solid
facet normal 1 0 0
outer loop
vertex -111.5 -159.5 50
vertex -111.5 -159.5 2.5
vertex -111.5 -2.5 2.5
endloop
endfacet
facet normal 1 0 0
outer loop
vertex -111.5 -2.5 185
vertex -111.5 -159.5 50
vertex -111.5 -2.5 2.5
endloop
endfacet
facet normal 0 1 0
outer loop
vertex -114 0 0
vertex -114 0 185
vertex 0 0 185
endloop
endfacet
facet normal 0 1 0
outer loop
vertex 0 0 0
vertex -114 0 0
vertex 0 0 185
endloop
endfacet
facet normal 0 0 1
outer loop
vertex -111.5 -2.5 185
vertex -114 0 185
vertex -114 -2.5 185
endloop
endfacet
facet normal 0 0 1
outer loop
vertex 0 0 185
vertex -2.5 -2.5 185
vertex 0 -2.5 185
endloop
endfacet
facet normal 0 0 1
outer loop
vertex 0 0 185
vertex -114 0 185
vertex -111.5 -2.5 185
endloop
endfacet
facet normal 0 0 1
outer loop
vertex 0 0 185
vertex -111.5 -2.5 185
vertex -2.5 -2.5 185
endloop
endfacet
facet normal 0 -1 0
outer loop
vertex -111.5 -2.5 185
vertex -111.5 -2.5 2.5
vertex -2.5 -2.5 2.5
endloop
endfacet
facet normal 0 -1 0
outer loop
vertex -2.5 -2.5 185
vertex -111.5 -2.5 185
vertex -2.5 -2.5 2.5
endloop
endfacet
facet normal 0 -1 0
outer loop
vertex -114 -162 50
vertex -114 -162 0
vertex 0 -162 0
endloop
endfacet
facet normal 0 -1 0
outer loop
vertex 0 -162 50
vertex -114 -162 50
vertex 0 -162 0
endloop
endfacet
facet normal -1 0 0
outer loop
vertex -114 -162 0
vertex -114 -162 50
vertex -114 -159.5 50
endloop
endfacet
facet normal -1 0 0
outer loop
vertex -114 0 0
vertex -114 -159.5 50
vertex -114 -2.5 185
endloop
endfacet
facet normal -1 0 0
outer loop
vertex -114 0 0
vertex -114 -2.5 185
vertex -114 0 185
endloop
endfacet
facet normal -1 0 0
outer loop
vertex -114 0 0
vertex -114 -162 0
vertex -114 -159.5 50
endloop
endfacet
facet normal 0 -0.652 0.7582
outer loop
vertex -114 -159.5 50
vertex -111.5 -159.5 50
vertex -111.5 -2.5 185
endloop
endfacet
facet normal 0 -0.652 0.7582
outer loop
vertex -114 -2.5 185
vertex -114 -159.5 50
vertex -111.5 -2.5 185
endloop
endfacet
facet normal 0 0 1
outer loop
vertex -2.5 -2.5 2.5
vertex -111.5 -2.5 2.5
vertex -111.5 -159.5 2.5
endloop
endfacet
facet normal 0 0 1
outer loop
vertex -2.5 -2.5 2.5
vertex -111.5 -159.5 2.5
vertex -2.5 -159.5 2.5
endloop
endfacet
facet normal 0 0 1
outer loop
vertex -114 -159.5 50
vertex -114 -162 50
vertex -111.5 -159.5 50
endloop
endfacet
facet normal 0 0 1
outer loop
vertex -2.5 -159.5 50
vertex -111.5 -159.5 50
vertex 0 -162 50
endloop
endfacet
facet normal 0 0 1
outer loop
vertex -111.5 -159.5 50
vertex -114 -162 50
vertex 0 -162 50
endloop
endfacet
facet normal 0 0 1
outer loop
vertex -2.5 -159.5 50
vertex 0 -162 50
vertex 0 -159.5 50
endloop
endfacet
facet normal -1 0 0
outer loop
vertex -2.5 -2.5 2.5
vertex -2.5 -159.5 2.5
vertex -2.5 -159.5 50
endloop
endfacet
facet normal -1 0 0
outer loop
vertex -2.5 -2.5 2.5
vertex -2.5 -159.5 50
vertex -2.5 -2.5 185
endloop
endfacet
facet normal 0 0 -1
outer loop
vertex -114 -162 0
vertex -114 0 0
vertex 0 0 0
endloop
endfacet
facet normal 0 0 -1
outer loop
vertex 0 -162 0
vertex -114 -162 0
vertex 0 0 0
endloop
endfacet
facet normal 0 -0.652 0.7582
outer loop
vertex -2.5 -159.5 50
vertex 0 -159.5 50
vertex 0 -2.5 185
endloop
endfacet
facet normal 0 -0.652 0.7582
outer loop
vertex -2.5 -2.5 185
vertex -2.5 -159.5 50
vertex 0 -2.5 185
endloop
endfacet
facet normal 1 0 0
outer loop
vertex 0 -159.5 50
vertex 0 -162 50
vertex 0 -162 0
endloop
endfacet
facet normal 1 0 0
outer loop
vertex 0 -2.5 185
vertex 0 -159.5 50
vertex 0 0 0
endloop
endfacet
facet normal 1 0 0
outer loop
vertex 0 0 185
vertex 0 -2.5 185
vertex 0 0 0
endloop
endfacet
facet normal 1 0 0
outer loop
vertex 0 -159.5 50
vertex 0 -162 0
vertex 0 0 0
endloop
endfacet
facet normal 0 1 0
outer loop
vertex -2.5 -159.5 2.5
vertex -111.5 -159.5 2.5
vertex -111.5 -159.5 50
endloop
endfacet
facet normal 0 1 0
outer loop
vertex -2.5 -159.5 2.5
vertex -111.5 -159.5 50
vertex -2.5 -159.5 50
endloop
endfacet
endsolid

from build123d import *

# Parameters (mm, degrees)
F0_W     = 114
F0_H     = 162
F1_DEPTH = 185
F3_DEPTH = 114
F5_W     = 109
F5_H     = 157
F6_DEPTH = 182.501


with BuildPart() as f1:
    # F0 (on Top) → F1 (new body)
    with BuildSketch(Plane.XY):
        with Locations((-57, -81)):
            Rectangle(F0_W, F0_H)
    extrude(amount=F1_DEPTH)

    # F2 (on Right) → F3 (cut, through all)
    with BuildSketch(Plane.YZ):
        Polygon((-162, 185), (-162, 50), (-159.5, 50), (-2.5, 185), align=None)
    extrude(amount=-F3_DEPTH, mode=Mode.SUBTRACT)

    # F5 (on offset) → F6 (cut, through all)
    with BuildSketch(Plane.XY.offset(2.5)):
        with Locations((-57, -81)):
            Rectangle(F5_W, F5_H)
    extrude(amount=F6_DEPTH, mode=Mode.SUBTRACT)


solid = f1.part
